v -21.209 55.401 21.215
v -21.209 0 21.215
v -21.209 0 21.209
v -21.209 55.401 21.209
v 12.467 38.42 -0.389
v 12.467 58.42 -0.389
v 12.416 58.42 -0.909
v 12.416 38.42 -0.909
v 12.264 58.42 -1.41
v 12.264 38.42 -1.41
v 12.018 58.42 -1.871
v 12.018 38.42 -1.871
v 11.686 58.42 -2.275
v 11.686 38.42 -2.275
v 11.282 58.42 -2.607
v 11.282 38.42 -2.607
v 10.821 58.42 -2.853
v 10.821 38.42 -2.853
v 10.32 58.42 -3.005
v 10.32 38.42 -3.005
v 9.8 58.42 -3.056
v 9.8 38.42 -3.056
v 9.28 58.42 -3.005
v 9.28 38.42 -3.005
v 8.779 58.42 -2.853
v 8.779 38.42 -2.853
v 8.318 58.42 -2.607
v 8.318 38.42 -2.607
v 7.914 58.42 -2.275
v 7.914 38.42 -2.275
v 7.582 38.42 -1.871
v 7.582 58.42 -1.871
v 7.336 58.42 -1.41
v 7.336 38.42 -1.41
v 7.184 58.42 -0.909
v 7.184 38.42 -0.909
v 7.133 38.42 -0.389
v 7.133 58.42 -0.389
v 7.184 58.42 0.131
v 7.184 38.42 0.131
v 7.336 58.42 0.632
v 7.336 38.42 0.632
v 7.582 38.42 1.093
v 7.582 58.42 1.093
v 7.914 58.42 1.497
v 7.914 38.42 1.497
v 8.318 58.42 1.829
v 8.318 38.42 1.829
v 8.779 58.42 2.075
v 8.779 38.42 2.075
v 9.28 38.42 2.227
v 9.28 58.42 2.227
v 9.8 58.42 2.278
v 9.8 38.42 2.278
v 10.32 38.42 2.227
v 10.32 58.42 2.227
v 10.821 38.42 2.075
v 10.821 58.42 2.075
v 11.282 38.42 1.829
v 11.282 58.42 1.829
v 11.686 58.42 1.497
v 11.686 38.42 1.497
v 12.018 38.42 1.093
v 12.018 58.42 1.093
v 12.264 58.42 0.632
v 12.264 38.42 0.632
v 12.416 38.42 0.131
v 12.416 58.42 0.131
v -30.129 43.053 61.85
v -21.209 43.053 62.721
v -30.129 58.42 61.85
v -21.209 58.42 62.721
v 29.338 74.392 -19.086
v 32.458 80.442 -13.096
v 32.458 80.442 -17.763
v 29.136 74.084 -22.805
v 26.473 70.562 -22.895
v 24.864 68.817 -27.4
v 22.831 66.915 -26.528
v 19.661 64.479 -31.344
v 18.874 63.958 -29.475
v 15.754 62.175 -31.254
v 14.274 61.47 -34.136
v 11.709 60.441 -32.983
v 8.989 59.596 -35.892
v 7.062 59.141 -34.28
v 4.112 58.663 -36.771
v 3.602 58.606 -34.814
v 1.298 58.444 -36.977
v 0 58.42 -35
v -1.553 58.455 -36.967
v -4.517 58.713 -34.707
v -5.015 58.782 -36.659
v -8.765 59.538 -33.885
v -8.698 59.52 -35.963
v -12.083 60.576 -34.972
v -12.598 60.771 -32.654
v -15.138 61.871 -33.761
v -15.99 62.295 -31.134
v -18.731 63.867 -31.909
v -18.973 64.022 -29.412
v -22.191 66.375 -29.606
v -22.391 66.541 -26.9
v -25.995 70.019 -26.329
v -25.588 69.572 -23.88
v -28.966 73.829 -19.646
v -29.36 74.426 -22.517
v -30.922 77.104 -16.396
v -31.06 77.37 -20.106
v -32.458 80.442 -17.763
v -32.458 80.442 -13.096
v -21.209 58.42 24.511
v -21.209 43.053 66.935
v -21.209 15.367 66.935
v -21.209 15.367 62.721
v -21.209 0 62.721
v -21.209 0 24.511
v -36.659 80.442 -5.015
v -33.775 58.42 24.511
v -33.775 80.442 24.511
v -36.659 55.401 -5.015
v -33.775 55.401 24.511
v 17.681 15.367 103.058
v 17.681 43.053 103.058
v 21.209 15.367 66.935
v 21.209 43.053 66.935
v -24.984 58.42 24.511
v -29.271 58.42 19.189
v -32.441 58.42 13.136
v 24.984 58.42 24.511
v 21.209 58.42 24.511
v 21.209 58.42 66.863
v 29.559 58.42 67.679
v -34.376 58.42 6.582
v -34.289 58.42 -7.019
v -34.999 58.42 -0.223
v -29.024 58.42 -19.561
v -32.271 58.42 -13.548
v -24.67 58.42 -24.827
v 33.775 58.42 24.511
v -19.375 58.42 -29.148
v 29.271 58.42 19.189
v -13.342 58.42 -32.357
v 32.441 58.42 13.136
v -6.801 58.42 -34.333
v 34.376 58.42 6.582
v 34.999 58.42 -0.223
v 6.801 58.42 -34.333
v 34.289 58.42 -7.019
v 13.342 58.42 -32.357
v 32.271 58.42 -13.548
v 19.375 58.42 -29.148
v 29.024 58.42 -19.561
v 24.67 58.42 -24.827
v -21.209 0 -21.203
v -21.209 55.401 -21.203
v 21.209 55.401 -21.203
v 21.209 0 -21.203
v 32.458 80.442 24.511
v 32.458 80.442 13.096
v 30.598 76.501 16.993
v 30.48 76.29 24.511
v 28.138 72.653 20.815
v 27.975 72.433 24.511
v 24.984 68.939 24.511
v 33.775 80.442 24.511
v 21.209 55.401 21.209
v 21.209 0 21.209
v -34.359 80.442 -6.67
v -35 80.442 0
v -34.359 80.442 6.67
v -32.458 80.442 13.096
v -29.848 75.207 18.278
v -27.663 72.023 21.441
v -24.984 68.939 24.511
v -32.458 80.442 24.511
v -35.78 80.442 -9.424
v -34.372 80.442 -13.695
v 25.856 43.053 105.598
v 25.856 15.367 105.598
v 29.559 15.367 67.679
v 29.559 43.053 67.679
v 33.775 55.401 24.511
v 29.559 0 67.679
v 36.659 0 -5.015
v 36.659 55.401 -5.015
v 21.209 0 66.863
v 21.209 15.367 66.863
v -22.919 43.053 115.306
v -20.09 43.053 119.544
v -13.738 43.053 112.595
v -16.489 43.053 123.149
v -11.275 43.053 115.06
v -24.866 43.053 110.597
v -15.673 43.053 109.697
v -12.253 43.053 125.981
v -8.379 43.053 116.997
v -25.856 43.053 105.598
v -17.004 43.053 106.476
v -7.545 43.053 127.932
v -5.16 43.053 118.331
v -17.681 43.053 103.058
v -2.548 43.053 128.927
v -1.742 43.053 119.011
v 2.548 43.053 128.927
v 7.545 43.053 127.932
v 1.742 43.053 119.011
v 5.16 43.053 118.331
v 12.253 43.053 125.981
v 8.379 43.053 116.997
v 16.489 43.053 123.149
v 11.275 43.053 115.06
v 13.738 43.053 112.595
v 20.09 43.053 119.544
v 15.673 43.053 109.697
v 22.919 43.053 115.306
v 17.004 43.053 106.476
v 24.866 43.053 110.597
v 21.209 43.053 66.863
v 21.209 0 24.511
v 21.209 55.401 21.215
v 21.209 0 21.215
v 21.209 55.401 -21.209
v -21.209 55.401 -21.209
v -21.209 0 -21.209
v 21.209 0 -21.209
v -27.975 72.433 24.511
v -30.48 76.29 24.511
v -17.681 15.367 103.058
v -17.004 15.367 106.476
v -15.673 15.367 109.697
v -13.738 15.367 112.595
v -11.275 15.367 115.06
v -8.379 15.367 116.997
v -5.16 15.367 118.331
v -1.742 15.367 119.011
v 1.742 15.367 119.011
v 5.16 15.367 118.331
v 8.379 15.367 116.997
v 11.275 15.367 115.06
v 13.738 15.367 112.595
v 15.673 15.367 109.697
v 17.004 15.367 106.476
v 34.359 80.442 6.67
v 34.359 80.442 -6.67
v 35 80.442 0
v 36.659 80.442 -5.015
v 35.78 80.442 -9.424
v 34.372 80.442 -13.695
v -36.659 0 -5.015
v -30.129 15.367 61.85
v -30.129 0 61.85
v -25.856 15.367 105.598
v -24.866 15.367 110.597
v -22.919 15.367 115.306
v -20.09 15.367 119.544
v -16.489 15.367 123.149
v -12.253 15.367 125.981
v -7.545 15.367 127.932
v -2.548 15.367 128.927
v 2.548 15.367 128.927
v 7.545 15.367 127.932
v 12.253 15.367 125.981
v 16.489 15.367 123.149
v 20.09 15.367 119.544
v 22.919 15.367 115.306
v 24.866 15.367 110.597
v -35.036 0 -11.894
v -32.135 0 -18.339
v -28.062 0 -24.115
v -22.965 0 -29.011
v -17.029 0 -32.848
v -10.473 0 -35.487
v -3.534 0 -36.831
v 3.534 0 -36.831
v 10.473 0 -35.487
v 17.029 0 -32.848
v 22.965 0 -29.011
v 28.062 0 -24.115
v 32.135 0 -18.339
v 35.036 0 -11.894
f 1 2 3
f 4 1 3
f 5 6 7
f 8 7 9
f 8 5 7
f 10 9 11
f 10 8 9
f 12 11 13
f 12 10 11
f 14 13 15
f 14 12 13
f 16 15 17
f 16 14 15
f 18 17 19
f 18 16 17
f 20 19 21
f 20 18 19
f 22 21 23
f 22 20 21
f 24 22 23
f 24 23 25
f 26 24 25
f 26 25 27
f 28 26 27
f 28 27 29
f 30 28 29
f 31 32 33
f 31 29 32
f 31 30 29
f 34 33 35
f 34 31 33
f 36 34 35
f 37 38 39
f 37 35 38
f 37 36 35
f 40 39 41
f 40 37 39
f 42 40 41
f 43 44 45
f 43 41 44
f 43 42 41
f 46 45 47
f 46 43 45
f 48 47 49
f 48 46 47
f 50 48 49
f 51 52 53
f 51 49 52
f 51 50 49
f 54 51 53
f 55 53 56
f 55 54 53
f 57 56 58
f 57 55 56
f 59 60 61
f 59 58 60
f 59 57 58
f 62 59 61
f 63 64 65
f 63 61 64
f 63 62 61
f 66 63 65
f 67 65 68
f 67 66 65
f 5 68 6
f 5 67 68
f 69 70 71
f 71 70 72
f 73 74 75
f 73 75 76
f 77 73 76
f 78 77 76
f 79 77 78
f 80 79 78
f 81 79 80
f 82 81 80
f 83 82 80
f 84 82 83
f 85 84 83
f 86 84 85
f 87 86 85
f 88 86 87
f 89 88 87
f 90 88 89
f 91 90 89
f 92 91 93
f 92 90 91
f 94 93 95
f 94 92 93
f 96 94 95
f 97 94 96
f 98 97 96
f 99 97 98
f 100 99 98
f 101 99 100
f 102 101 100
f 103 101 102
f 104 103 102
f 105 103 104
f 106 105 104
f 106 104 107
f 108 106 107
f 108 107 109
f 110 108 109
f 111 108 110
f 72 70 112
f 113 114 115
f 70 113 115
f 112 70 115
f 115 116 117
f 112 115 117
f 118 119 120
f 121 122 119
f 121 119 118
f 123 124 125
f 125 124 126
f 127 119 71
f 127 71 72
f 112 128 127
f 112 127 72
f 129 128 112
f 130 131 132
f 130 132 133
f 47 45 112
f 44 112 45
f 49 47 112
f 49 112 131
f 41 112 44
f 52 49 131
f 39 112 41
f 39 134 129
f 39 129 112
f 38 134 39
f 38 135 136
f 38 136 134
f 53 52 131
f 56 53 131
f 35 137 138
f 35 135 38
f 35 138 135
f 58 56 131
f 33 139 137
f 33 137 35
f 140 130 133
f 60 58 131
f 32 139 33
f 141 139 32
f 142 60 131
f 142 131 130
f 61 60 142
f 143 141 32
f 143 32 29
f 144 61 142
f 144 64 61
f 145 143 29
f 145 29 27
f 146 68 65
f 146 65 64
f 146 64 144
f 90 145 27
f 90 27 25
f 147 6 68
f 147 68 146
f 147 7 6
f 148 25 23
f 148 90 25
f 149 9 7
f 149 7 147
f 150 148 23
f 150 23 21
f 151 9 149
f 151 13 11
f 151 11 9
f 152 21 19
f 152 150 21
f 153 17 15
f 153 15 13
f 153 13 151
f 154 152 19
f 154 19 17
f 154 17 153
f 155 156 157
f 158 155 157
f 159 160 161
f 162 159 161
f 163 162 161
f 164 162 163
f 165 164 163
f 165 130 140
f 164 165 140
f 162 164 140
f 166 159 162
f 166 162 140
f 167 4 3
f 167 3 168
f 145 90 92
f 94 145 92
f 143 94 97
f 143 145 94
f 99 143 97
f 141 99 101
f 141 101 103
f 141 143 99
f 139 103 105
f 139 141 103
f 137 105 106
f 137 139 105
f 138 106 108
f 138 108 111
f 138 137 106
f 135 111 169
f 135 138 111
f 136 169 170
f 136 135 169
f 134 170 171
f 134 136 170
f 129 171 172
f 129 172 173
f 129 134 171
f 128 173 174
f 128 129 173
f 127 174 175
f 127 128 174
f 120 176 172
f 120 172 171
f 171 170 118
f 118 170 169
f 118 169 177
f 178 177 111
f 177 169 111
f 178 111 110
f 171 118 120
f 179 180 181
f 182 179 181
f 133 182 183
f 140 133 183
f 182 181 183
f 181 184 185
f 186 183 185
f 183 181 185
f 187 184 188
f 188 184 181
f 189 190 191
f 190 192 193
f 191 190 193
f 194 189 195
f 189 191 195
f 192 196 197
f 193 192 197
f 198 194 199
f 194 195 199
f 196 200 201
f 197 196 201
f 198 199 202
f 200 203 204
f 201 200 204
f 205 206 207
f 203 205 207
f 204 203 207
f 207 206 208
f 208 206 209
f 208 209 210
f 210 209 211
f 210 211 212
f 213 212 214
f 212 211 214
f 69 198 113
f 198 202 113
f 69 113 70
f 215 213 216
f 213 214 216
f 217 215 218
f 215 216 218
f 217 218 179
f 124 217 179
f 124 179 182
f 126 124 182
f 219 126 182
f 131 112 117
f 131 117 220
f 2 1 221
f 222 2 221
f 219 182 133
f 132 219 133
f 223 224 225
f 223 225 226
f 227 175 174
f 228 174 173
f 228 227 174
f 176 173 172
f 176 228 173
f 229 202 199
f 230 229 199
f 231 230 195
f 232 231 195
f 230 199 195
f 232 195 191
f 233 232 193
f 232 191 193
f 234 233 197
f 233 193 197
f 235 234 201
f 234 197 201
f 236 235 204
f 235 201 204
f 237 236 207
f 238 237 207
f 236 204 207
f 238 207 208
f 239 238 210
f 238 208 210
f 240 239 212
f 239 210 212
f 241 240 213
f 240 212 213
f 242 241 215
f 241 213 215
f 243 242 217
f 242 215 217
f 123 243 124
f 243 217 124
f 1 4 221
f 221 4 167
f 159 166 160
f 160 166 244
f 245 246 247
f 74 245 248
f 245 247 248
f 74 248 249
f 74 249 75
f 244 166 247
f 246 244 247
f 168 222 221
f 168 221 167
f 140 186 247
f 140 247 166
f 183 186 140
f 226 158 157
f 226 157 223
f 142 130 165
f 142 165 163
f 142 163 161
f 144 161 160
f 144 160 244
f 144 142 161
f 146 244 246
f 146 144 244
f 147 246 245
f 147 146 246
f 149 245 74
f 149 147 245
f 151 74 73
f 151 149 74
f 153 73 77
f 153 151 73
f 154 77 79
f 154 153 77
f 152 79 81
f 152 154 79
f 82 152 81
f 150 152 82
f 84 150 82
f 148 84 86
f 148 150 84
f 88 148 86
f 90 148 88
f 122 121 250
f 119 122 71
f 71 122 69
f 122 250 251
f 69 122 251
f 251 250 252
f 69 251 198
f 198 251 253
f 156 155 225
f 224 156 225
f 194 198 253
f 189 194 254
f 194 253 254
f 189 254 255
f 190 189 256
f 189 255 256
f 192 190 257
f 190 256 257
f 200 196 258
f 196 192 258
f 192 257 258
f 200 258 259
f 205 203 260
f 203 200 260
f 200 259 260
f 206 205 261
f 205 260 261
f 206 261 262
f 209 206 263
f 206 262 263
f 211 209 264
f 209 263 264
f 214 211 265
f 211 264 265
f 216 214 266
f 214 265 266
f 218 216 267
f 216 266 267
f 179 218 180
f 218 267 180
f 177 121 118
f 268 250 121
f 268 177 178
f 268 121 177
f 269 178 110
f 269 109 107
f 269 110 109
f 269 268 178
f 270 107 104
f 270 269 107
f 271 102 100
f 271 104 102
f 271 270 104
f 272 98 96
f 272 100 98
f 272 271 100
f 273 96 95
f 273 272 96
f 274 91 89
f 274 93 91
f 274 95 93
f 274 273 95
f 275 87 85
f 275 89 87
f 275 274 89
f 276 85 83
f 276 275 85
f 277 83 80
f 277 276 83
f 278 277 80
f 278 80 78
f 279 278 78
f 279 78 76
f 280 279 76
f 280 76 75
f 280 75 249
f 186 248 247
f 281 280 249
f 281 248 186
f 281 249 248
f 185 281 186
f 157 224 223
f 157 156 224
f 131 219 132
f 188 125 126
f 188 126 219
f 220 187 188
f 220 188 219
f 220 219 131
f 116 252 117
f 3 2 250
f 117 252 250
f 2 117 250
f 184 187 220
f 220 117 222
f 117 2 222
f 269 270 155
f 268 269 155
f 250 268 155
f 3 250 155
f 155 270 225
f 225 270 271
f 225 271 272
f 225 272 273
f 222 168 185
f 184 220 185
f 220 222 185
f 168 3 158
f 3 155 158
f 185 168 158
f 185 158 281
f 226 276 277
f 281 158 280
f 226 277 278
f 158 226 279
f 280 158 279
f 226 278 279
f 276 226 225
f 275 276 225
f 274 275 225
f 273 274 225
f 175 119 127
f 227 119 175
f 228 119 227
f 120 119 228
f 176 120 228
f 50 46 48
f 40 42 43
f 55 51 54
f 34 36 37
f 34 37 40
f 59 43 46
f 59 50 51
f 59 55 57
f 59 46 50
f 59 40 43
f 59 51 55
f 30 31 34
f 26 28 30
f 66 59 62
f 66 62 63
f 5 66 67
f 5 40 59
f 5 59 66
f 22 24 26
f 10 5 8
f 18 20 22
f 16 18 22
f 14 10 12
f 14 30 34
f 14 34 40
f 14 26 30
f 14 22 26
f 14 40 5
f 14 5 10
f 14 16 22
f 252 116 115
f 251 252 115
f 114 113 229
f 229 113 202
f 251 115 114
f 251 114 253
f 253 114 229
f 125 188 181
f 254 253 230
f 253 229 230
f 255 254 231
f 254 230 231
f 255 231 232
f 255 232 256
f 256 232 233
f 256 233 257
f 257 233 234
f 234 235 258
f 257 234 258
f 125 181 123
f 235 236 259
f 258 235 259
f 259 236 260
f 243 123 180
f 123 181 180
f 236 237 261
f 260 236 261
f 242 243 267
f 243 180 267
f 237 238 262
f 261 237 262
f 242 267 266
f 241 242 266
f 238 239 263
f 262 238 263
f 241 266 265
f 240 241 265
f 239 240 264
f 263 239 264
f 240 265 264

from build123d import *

# Parameters (mm, degrees)
SKETCH1_W                = 42.418
SKETCH1_H                = 0.006053875
SKETCH1_H_2              = 42.424053875
BOSS_EXTRUDE1_DEPTH      = 58.42
CUT_EXTRUDE3_DEPTH       = 68.58
SKETCH3_W                = 38.1
SKETCH3_H                = 15.367
SKETCH3_W_2              = 76.2
CUT_EXTRUDE4_DEPTH       = 77.078788463
BOSS_EXTRUDE6_DEPTH      = 3.302
BOSS_EXTRUDE6_DEPTH_BACK = 60
CUT_EXTRUDE9_DEPTH       = 106
SKETCH4_R                = 2.667
CUT_EXTRUDE6_DEPTH       = 106
CUT_EXTRUDE6_DEPTH_BACK  = 20
CUT_EXTRUDE13_DEPTH      = 106
SKETCH11_R               = 35
CUT_EXTRUDE15_DEPTH      = 106


with BuildPart() as part:
    # Sketch1 → Boss-Extrude1 (new body)
    with BuildSketch(Plane(origin=(0, 0, 0), x_dir=(1, 0, 0), z_dir=(0, 1, 0))):
        with BuildLine():
            ThreePointArc((36.658549334, 5.015053409), (0, 37), (-36.658549334, 5.015053409))
            Line((-36.658549334, 5.015053409), (-25.85615018, -105.598244919))
            ThreePointArc((-25.85615018, -105.598244919), (0, -129.052312238), (25.85615018, -105.598244919))
            Line((25.85615018, -105.598244919), (36.658549334, 5.015053409))
        make_face()
        with Locations((0, 21.205973063)):
            Rectangle(SKETCH1_W, SKETCH1_H, mode=Mode.SUBTRACT)
        with Locations((0, -21.212026937)):
            Rectangle(SKETCH1_W, SKETCH1_H, mode=Mode.SUBTRACT)
        with Locations((0, -45.723026938)):
            Rectangle(SKETCH1_W, SKETCH1_H_2, mode=Mode.SUBTRACT)
    extrude(amount=BOSS_EXTRUDE1_DEPTH)

    # Sketch2 → Cut-Extrude3 (cut)
    with BuildSketch(Plane(origin=(0, 58.42, 0), x_dir=(1, 0, 0), z_dir=(0, 1, 0))):
        with BuildLine():
            Line((-21.209, -66.935053875), (-17.681227978, -103.058371806))
            ThreePointArc((-17.681227978, -103.058371806), (0, -119.096981901), (17.681227978, -103.058371806))
            Line((17.681227978, -103.058371806), (21.209, -66.935053875))
            Line((21.209, -66.935053875), (-21.209, -66.935053875))
        make_face()
    extrude(amount=-CUT_EXTRUDE3_DEPTH, mode=Mode.SUBTRACT)

    # Sketch3 → Cut-Extrude4 (cut, through all)
    with BuildSketch(Plane(origin=(35.827089604, 0, 3.498842619), x_dir=(0.097196738, 0, -0.995265188), z_dir=(0.995265188, 0, 0.097196738))):
        with Locations((-121.635123595, 7.6835)):
            Rectangle(SKETCH3_W, SKETCH3_H)
        with Locations((-83.535123595, 7.6835)):
            Rectangle(SKETCH3_W, SKETCH3_H)
        with Locations((-102.585123595, 50.7365)):
            Rectangle(SKETCH3_W_2, SKETCH3_H)
    extrude(amount=-CUT_EXTRUDE4_DEPTH, mode=Mode.SUBTRACT)

    # Sketch7 → Boss-Extrude6 (add, two sides)
    with BuildSketch(Plane.XY.offset(21.209)) as boss_extrude6_sk:
        with BuildLine():
            Line((-34.93, 93.35), (-40.014696591, 94.207479888))
            Line((-40.014696591, 94.207479888), (-40.014696591, 55.40139672))
            Line((-40.014696591, 55.40139672), (41.480417685, 55.40139672))
            Line((41.480417685, 55.40139672), (41.480417685, 93.35))
            Line((41.480417685, 93.35), (34.93, 93.35))
            ThreePointArc((34.93, 93.35), (0, 58.42), (-34.93, 93.35))
        make_face()
    extrude(amount=BOSS_EXTRUDE6_DEPTH)
    extrude(boss_extrude6_sk.sketch, amount=-BOSS_EXTRUDE6_DEPTH_BACK)

    # Sketch9 → Cut-Extrude9 (cut)
    with BuildSketch(Plane.XZ):
        with BuildLine():
            Line((36.658549334, -5.015053409), (29.559345914, 67.678641264))
            Line((29.559345914, 67.678641264), (73.660631966, -15.324129582))
            Line((73.660631966, -15.324129582), (14.272065625, -84.211573711))
            Line((14.272065625, -84.211573711), (-60.028569558, -39.869360469))
            Line((-60.028569558, -39.869360469), (-30.128608249, 61.849567226))
            Line((-30.128608249, 61.849567226), (-36.658549334, -5.015053409))
            ThreePointArc((-36.658549334, -5.015053409), (0, -37), (36.658549334, -5.015053409))
        make_face()
    extrude(amount=-CUT_EXTRUDE9_DEPTH, mode=Mode.SUBTRACT)

    # Sketch4 → Cut-Extrude6 (cut, two sides)
    with BuildSketch(Plane(origin=(0, 58.42, 0), x_dir=(1, 0, 0), z_dir=(0, 1, 0))) as cut_extrude6_sk:
        with Locations((9.8, 0.389)):
            Circle(SKETCH4_R)
    extrude(amount=CUT_EXTRUDE6_DEPTH, mode=Mode.SUBTRACT)
    extrude(cut_extrude6_sk.sketch, amount=-CUT_EXTRUDE6_DEPTH_BACK, mode=Mode.SUBTRACT)

    # Sketch10 → Cut-Extrude13 (cut)
    with BuildSketch(Plane(origin=(35.827089604, 0, 3.498842619), x_dir=(0.097196738, 0, -0.995265188), z_dir=(0.995265188, 0, 0.097196738))):
        Polygon((-21.112119301, 84.442127612), (-21.112119301, 80.442127612), (1.82615742, 80.442127612), (48.352358454, 80.442127612), (47.215493026, 104.044705577), (-21.112119301, 100.753569315), align=None)
        Polygon((-34.412747442, 80.442127612), (-21.112119301, 80.442127612), (-21.112119301, 84.442127612), (-21.112119301, 100.753569315), (-34.412747442, 100.753569315), align=None)
    extrude(amount=-CUT_EXTRUDE13_DEPTH, mode=Mode.SUBTRACT)

    # Sketch11 → Cut-Extrude15 (cut)
    with BuildSketch(Plane(origin=(0, 58.42, 0), x_dir=(1, 0, 0), z_dir=(0, 1, 0))):
        Circle(SKETCH11_R)
    extrude(amount=CUT_EXTRUDE15_DEPTH, mode=Mode.SUBTRACT)


solid = part.part
